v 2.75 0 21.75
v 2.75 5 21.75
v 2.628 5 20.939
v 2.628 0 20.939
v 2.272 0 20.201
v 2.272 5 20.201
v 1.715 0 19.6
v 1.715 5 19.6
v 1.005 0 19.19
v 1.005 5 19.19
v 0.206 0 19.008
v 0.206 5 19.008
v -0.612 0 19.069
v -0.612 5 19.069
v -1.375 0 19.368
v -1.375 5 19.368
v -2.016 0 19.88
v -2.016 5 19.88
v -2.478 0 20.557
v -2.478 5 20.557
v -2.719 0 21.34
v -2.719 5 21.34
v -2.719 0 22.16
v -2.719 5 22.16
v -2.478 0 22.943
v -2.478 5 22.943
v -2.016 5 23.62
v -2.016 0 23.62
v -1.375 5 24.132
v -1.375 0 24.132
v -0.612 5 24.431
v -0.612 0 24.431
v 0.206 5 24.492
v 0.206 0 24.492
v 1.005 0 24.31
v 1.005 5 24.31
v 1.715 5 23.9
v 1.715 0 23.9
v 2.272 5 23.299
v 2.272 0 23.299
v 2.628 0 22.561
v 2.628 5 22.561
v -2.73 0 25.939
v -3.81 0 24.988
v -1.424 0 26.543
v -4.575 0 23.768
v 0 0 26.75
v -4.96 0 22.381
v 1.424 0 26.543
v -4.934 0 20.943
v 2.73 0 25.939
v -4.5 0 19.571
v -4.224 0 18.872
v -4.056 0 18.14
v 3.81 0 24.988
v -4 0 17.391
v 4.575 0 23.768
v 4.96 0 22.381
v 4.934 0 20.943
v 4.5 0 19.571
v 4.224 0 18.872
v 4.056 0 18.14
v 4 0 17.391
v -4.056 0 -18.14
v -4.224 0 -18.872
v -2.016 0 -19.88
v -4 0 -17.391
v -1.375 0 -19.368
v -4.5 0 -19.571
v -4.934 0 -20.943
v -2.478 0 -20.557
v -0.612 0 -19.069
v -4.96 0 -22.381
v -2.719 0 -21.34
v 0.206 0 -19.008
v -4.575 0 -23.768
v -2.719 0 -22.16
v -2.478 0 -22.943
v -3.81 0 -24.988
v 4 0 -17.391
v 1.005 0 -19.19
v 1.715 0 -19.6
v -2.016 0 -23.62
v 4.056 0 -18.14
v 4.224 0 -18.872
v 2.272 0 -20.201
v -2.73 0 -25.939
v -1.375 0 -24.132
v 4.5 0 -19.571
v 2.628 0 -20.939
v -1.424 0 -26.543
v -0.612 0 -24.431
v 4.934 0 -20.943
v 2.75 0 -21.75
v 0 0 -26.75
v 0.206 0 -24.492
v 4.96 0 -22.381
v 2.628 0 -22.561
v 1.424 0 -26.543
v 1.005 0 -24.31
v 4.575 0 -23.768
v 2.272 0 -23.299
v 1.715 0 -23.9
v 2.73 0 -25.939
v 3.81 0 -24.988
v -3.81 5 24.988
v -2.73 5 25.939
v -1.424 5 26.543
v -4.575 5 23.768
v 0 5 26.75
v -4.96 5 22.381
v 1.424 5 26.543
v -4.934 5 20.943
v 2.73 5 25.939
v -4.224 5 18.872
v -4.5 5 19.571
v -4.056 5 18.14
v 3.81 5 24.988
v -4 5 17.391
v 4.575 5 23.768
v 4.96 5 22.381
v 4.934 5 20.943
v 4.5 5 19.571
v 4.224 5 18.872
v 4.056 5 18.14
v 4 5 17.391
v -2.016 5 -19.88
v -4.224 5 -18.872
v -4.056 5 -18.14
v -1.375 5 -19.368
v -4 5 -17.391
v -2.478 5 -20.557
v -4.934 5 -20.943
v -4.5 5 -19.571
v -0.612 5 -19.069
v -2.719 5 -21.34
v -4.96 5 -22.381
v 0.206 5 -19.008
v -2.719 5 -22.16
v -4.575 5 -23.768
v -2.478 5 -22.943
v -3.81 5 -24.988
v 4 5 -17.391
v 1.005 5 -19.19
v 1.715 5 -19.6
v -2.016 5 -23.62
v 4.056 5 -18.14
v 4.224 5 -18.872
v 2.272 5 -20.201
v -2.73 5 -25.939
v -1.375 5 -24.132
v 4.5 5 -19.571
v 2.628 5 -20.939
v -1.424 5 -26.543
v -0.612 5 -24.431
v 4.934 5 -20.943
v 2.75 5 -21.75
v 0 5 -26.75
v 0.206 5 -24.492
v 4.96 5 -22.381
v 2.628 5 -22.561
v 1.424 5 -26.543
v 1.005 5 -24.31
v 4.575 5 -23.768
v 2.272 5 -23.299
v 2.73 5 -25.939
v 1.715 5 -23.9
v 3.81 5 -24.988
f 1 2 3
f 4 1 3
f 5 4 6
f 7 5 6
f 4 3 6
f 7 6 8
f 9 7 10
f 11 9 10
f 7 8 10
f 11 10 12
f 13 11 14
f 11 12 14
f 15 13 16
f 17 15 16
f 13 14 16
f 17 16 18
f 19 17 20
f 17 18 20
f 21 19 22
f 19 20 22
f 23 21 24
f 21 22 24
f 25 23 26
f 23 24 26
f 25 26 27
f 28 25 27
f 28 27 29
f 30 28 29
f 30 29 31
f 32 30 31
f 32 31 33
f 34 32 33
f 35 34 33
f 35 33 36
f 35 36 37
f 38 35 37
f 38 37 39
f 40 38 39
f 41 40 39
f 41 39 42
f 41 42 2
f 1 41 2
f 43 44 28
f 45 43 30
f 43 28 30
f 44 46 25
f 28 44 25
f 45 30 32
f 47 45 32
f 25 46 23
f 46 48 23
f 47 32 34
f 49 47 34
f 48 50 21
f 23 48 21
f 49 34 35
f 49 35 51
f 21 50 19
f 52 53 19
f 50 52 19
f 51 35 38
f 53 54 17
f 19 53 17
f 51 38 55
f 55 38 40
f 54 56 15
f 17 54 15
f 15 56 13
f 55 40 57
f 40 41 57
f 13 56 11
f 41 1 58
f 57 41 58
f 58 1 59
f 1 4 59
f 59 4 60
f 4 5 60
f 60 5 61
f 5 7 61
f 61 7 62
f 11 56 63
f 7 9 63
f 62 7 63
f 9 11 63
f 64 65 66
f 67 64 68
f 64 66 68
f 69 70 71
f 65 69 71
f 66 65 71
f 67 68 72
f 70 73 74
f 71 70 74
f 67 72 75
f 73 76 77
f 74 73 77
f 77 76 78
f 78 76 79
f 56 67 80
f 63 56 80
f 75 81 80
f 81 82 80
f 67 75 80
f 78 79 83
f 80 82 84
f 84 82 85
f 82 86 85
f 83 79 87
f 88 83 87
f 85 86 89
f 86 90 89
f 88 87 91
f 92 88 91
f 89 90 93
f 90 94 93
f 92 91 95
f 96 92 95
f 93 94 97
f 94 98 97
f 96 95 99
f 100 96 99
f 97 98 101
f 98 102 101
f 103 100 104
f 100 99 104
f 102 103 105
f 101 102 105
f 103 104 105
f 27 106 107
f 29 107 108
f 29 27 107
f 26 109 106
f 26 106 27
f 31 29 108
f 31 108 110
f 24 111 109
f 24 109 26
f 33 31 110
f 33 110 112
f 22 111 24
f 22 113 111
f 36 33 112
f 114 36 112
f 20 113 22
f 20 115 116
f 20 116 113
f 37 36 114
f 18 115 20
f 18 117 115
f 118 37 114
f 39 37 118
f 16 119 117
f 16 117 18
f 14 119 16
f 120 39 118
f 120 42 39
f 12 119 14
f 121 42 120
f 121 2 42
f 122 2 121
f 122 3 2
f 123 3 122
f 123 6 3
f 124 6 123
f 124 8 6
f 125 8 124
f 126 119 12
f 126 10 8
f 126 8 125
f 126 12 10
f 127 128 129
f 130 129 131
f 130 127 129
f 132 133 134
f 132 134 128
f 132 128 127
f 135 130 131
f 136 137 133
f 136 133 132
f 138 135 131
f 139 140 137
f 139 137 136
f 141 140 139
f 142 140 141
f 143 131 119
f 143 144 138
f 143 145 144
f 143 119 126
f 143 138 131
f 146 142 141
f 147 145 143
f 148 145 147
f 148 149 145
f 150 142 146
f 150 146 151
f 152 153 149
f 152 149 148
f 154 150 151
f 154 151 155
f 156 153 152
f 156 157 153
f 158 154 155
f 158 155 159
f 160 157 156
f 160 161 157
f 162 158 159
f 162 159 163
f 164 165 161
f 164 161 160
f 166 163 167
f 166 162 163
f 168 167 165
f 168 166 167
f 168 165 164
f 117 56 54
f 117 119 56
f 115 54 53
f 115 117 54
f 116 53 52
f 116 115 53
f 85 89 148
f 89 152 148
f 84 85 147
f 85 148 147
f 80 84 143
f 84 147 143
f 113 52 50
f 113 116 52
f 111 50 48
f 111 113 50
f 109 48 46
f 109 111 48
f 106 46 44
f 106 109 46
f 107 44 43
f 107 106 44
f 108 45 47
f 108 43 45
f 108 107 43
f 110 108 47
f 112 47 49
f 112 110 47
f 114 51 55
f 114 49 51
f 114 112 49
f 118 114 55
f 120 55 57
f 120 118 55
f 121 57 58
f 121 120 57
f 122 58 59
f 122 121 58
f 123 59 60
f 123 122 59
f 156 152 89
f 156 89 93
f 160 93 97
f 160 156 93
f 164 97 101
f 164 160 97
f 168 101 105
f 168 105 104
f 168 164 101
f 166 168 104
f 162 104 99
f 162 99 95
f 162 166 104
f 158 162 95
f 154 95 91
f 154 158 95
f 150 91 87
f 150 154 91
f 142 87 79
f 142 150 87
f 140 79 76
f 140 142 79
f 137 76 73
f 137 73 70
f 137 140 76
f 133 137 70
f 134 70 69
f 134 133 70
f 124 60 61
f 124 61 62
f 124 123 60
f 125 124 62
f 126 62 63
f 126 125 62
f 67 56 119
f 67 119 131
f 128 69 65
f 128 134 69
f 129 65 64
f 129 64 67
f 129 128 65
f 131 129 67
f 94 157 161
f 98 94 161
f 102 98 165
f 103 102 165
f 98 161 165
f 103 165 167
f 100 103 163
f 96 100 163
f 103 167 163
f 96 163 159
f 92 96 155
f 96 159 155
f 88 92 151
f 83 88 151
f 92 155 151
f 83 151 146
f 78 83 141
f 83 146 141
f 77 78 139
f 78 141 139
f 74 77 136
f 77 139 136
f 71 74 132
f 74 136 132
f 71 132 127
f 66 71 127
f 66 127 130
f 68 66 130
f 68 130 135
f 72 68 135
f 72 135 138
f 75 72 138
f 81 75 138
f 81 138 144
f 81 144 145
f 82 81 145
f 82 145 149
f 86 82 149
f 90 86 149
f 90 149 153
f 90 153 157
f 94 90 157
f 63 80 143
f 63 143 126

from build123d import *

# Parameters (mm, degrees)
BOSS_EXTRUDE1_DEPTH = 5
SKETCH2_R           = 2.75
CUT_EXTRUDE2_DEPTH  = 6
SKETCH3_R           = 5
SKETCH3_R_2         = 2.75
BOSS_EXTRUDE2_DEPTH = 5
FILLET1_R           = 5


with BuildPart() as part:
    # Sketch1 → Boss-Extrude1 (new body)
    with BuildSketch(Plane(origin=(0, 0, 0), x_dir=(1, 0, 0), z_dir=(0, 1, 0))):
        with BuildLine():
            Line((-4, -21.75), (-4, 21.75))
            ThreePointArc((-4, 21.75), (0, 25.75), (4, 21.75))
            Line((4, 21.75), (4, -21.75))
            ThreePointArc((4, -21.75), (0, -25.75), (-4, -21.75))
        make_face()
    extrude(amount=BOSS_EXTRUDE1_DEPTH)

    # Sketch2 → Cut-Extrude2 (cut, through all)
    with BuildSketch(Plane(origin=(0, 5, 0), x_dir=(1, 0, 0), z_dir=(0, 1, 0))):
        with Locations((0, 21.75)):
            Circle(SKETCH2_R)
        with Locations((0, -21.75)):
            Circle(SKETCH2_R)
    extrude(amount=-CUT_EXTRUDE2_DEPTH, mode=Mode.SUBTRACT)

    # Sketch3 → Boss-Extrude2 (add)
    with BuildSketch(Plane(origin=(0, 5, 0), x_dir=(1, 0, 0), z_dir=(0, 1, 0))):
        with Locations((0, 21.75)):
            Circle(SKETCH3_R)
        with Locations((0, 21.75)):
            Circle(SKETCH3_R_2, mode=Mode.SUBTRACT)
        with Locations((0, -21.75)):
            Circle(SKETCH3_R)
        with Locations((0, -21.75)):
            Circle(SKETCH3_R_2, mode=Mode.SUBTRACT)
    extrude(amount=-BOSS_EXTRUDE2_DEPTH)

    # Fillet1
    fillet1_edges = [part.edges().sort_by_distance(p)[0] for p in [
        (-4, 2.5, -18.75),
        (4, 2.5, -18.75),
        (-4, 2.5, 18.75),
        (4, 2.5, 18.75),
    ]]
    fillet(fillet1_edges, radius=FILLET1_R)


solid = part.part
